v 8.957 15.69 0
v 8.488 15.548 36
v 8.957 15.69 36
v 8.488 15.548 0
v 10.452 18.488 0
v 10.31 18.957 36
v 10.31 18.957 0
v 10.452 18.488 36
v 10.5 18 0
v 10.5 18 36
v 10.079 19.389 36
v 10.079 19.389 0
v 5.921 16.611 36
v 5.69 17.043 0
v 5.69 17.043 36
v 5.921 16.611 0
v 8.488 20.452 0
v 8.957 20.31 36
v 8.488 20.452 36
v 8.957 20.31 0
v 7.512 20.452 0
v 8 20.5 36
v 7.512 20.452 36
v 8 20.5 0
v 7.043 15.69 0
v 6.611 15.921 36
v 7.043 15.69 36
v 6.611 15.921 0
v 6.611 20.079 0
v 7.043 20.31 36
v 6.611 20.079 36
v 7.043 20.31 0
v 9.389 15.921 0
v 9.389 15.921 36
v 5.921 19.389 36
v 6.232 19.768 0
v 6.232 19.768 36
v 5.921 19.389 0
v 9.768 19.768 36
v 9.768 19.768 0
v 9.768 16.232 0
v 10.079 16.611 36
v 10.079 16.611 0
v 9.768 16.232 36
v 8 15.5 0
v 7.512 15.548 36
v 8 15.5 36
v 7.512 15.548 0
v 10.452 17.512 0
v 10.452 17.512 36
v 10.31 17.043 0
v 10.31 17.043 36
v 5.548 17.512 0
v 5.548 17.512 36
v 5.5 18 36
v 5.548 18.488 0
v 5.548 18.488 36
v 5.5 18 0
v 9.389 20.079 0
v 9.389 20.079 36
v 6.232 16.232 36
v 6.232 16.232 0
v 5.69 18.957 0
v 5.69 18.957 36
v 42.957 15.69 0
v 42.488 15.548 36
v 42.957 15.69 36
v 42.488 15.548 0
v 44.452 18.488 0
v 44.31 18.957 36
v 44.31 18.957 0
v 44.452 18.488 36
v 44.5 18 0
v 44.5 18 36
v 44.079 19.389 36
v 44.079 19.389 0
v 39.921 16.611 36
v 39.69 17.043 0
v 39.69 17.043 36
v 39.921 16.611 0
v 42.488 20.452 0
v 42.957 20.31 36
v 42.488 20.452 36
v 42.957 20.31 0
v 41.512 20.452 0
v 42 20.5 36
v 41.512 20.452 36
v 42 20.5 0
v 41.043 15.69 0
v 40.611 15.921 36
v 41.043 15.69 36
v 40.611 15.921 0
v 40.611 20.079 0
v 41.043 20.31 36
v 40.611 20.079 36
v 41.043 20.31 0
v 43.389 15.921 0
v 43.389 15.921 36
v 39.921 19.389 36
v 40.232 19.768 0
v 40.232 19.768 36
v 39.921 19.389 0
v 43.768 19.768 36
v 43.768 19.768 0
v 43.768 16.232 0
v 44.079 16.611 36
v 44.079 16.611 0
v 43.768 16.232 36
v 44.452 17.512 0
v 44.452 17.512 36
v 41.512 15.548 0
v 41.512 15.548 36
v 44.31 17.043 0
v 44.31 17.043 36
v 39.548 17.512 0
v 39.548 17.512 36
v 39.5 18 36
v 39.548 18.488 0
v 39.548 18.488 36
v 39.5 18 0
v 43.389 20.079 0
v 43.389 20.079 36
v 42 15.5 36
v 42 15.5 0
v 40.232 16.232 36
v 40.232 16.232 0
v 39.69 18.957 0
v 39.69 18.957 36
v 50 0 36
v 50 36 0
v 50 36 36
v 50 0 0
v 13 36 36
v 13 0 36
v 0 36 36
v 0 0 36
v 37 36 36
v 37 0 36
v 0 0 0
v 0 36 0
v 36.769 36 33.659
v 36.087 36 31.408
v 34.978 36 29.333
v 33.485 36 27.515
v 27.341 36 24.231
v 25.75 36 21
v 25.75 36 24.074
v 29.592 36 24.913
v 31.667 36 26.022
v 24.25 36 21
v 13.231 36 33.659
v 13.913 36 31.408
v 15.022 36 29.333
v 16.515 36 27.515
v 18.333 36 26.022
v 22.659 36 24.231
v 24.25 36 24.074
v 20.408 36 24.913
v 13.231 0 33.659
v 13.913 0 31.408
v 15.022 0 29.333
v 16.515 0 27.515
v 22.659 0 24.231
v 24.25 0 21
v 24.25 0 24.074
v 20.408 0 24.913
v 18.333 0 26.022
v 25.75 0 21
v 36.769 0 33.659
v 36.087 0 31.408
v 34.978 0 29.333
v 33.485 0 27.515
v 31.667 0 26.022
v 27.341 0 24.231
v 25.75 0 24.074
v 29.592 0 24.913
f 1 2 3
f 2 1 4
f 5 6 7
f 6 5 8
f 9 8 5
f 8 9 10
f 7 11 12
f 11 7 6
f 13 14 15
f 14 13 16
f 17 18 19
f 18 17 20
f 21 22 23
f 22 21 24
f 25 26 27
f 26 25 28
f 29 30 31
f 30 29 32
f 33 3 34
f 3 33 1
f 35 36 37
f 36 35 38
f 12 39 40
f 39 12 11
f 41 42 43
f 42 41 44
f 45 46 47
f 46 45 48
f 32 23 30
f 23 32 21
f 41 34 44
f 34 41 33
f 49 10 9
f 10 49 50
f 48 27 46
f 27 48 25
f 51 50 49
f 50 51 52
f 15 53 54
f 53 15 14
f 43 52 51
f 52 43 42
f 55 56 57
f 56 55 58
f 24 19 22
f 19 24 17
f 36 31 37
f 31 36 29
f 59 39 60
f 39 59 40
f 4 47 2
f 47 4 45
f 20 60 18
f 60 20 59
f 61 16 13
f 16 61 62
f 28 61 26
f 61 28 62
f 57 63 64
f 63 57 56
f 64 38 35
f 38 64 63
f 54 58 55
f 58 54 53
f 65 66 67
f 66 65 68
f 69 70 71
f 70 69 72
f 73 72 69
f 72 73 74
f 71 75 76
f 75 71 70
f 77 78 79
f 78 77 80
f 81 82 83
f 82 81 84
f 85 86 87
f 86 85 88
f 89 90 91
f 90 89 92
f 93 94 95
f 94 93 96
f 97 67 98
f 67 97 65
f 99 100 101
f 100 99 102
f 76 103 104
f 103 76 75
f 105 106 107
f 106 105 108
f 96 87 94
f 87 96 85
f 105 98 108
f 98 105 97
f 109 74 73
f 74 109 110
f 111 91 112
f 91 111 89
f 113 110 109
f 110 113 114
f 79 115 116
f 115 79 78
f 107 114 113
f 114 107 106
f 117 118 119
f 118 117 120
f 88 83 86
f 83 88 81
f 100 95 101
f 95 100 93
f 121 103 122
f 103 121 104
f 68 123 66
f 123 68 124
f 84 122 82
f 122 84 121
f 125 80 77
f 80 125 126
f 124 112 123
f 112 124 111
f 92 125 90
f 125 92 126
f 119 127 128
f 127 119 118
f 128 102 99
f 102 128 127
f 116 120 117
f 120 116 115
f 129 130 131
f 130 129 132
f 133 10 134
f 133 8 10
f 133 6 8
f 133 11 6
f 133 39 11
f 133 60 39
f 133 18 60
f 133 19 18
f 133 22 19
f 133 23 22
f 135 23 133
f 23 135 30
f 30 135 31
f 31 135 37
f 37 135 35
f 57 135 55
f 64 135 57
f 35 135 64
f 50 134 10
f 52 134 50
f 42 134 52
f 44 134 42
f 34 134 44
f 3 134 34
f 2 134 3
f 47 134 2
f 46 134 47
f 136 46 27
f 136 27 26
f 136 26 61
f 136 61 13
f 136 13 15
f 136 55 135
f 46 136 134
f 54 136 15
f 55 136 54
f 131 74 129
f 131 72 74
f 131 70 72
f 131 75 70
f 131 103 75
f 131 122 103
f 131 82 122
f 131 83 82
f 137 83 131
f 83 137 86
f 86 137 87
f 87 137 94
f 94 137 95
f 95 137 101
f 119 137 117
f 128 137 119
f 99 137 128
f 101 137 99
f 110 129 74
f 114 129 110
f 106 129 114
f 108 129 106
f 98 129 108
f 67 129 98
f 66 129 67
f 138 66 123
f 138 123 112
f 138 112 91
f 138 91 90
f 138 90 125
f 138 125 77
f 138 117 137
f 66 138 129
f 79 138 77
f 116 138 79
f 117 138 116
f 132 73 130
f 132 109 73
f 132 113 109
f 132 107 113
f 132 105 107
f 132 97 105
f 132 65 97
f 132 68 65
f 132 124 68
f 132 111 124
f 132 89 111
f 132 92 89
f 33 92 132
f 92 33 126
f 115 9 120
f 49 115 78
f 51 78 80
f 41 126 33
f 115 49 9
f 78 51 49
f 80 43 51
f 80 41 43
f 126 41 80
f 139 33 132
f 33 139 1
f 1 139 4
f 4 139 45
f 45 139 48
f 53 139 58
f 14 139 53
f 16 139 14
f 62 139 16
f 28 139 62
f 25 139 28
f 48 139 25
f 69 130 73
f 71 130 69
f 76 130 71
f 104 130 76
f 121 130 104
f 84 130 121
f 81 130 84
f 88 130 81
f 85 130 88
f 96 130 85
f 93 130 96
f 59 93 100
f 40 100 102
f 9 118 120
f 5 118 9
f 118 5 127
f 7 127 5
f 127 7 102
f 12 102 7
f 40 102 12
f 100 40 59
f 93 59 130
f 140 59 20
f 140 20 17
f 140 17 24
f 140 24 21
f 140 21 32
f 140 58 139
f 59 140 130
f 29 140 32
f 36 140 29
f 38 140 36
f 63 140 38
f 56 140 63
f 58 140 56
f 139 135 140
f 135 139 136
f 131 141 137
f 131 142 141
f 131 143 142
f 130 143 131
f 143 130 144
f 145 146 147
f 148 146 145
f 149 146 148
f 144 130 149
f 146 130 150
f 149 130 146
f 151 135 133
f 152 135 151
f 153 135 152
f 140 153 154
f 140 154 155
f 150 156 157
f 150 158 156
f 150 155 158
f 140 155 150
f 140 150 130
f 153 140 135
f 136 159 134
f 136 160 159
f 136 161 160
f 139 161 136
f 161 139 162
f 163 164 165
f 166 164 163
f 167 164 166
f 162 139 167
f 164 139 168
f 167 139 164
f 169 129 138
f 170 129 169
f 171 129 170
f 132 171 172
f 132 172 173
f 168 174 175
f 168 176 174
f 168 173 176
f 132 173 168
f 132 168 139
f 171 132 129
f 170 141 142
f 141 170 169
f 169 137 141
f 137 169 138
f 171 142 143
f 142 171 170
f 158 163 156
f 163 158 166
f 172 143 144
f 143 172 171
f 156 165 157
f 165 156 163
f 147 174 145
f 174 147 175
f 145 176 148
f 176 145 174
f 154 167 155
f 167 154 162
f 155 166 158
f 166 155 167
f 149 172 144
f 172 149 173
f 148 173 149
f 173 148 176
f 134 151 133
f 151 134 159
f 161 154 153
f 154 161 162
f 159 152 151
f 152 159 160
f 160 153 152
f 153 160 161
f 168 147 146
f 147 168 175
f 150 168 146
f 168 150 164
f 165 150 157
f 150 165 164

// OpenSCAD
$fn = 32;

// ----------------------------------------------------------------------
// Saddle clamp: split shaft clamp
// ----------------------------------------------------------------------

// --- parameters (mm) ---
blk_l = 50;               // block length, X
blk_w = 36;               // block width, Y
blk_h = 36;               // block height
clamp_r = 12;             // shaft groove radius
hole_r = 2.5;             // bolt hole radius
hole_m = 8;               // bolt hole margin from the ends
saw_w = 1.5;              // saw kerf width

saw_depth = clamp_r + 3;  // saw kerf depth

difference() {
  cube([blk_l, blk_w, blk_h]);
  translate([blk_l / 2, -1, blk_h])
    rotate([-90, 0, 0])
      cylinder(h = blk_w + 2, r = clamp_r);
  for (sx = [0, 1])
    translate([sx ? blk_l - hole_m : hole_m, blk_w / 2, -1])
      cylinder(r = hole_r, h = blk_h + 2);
  translate([blk_l / 2 - saw_w / 2, -1, blk_h - saw_depth])
    cube([saw_w, blk_w + 2, saw_depth + 1]);
}
